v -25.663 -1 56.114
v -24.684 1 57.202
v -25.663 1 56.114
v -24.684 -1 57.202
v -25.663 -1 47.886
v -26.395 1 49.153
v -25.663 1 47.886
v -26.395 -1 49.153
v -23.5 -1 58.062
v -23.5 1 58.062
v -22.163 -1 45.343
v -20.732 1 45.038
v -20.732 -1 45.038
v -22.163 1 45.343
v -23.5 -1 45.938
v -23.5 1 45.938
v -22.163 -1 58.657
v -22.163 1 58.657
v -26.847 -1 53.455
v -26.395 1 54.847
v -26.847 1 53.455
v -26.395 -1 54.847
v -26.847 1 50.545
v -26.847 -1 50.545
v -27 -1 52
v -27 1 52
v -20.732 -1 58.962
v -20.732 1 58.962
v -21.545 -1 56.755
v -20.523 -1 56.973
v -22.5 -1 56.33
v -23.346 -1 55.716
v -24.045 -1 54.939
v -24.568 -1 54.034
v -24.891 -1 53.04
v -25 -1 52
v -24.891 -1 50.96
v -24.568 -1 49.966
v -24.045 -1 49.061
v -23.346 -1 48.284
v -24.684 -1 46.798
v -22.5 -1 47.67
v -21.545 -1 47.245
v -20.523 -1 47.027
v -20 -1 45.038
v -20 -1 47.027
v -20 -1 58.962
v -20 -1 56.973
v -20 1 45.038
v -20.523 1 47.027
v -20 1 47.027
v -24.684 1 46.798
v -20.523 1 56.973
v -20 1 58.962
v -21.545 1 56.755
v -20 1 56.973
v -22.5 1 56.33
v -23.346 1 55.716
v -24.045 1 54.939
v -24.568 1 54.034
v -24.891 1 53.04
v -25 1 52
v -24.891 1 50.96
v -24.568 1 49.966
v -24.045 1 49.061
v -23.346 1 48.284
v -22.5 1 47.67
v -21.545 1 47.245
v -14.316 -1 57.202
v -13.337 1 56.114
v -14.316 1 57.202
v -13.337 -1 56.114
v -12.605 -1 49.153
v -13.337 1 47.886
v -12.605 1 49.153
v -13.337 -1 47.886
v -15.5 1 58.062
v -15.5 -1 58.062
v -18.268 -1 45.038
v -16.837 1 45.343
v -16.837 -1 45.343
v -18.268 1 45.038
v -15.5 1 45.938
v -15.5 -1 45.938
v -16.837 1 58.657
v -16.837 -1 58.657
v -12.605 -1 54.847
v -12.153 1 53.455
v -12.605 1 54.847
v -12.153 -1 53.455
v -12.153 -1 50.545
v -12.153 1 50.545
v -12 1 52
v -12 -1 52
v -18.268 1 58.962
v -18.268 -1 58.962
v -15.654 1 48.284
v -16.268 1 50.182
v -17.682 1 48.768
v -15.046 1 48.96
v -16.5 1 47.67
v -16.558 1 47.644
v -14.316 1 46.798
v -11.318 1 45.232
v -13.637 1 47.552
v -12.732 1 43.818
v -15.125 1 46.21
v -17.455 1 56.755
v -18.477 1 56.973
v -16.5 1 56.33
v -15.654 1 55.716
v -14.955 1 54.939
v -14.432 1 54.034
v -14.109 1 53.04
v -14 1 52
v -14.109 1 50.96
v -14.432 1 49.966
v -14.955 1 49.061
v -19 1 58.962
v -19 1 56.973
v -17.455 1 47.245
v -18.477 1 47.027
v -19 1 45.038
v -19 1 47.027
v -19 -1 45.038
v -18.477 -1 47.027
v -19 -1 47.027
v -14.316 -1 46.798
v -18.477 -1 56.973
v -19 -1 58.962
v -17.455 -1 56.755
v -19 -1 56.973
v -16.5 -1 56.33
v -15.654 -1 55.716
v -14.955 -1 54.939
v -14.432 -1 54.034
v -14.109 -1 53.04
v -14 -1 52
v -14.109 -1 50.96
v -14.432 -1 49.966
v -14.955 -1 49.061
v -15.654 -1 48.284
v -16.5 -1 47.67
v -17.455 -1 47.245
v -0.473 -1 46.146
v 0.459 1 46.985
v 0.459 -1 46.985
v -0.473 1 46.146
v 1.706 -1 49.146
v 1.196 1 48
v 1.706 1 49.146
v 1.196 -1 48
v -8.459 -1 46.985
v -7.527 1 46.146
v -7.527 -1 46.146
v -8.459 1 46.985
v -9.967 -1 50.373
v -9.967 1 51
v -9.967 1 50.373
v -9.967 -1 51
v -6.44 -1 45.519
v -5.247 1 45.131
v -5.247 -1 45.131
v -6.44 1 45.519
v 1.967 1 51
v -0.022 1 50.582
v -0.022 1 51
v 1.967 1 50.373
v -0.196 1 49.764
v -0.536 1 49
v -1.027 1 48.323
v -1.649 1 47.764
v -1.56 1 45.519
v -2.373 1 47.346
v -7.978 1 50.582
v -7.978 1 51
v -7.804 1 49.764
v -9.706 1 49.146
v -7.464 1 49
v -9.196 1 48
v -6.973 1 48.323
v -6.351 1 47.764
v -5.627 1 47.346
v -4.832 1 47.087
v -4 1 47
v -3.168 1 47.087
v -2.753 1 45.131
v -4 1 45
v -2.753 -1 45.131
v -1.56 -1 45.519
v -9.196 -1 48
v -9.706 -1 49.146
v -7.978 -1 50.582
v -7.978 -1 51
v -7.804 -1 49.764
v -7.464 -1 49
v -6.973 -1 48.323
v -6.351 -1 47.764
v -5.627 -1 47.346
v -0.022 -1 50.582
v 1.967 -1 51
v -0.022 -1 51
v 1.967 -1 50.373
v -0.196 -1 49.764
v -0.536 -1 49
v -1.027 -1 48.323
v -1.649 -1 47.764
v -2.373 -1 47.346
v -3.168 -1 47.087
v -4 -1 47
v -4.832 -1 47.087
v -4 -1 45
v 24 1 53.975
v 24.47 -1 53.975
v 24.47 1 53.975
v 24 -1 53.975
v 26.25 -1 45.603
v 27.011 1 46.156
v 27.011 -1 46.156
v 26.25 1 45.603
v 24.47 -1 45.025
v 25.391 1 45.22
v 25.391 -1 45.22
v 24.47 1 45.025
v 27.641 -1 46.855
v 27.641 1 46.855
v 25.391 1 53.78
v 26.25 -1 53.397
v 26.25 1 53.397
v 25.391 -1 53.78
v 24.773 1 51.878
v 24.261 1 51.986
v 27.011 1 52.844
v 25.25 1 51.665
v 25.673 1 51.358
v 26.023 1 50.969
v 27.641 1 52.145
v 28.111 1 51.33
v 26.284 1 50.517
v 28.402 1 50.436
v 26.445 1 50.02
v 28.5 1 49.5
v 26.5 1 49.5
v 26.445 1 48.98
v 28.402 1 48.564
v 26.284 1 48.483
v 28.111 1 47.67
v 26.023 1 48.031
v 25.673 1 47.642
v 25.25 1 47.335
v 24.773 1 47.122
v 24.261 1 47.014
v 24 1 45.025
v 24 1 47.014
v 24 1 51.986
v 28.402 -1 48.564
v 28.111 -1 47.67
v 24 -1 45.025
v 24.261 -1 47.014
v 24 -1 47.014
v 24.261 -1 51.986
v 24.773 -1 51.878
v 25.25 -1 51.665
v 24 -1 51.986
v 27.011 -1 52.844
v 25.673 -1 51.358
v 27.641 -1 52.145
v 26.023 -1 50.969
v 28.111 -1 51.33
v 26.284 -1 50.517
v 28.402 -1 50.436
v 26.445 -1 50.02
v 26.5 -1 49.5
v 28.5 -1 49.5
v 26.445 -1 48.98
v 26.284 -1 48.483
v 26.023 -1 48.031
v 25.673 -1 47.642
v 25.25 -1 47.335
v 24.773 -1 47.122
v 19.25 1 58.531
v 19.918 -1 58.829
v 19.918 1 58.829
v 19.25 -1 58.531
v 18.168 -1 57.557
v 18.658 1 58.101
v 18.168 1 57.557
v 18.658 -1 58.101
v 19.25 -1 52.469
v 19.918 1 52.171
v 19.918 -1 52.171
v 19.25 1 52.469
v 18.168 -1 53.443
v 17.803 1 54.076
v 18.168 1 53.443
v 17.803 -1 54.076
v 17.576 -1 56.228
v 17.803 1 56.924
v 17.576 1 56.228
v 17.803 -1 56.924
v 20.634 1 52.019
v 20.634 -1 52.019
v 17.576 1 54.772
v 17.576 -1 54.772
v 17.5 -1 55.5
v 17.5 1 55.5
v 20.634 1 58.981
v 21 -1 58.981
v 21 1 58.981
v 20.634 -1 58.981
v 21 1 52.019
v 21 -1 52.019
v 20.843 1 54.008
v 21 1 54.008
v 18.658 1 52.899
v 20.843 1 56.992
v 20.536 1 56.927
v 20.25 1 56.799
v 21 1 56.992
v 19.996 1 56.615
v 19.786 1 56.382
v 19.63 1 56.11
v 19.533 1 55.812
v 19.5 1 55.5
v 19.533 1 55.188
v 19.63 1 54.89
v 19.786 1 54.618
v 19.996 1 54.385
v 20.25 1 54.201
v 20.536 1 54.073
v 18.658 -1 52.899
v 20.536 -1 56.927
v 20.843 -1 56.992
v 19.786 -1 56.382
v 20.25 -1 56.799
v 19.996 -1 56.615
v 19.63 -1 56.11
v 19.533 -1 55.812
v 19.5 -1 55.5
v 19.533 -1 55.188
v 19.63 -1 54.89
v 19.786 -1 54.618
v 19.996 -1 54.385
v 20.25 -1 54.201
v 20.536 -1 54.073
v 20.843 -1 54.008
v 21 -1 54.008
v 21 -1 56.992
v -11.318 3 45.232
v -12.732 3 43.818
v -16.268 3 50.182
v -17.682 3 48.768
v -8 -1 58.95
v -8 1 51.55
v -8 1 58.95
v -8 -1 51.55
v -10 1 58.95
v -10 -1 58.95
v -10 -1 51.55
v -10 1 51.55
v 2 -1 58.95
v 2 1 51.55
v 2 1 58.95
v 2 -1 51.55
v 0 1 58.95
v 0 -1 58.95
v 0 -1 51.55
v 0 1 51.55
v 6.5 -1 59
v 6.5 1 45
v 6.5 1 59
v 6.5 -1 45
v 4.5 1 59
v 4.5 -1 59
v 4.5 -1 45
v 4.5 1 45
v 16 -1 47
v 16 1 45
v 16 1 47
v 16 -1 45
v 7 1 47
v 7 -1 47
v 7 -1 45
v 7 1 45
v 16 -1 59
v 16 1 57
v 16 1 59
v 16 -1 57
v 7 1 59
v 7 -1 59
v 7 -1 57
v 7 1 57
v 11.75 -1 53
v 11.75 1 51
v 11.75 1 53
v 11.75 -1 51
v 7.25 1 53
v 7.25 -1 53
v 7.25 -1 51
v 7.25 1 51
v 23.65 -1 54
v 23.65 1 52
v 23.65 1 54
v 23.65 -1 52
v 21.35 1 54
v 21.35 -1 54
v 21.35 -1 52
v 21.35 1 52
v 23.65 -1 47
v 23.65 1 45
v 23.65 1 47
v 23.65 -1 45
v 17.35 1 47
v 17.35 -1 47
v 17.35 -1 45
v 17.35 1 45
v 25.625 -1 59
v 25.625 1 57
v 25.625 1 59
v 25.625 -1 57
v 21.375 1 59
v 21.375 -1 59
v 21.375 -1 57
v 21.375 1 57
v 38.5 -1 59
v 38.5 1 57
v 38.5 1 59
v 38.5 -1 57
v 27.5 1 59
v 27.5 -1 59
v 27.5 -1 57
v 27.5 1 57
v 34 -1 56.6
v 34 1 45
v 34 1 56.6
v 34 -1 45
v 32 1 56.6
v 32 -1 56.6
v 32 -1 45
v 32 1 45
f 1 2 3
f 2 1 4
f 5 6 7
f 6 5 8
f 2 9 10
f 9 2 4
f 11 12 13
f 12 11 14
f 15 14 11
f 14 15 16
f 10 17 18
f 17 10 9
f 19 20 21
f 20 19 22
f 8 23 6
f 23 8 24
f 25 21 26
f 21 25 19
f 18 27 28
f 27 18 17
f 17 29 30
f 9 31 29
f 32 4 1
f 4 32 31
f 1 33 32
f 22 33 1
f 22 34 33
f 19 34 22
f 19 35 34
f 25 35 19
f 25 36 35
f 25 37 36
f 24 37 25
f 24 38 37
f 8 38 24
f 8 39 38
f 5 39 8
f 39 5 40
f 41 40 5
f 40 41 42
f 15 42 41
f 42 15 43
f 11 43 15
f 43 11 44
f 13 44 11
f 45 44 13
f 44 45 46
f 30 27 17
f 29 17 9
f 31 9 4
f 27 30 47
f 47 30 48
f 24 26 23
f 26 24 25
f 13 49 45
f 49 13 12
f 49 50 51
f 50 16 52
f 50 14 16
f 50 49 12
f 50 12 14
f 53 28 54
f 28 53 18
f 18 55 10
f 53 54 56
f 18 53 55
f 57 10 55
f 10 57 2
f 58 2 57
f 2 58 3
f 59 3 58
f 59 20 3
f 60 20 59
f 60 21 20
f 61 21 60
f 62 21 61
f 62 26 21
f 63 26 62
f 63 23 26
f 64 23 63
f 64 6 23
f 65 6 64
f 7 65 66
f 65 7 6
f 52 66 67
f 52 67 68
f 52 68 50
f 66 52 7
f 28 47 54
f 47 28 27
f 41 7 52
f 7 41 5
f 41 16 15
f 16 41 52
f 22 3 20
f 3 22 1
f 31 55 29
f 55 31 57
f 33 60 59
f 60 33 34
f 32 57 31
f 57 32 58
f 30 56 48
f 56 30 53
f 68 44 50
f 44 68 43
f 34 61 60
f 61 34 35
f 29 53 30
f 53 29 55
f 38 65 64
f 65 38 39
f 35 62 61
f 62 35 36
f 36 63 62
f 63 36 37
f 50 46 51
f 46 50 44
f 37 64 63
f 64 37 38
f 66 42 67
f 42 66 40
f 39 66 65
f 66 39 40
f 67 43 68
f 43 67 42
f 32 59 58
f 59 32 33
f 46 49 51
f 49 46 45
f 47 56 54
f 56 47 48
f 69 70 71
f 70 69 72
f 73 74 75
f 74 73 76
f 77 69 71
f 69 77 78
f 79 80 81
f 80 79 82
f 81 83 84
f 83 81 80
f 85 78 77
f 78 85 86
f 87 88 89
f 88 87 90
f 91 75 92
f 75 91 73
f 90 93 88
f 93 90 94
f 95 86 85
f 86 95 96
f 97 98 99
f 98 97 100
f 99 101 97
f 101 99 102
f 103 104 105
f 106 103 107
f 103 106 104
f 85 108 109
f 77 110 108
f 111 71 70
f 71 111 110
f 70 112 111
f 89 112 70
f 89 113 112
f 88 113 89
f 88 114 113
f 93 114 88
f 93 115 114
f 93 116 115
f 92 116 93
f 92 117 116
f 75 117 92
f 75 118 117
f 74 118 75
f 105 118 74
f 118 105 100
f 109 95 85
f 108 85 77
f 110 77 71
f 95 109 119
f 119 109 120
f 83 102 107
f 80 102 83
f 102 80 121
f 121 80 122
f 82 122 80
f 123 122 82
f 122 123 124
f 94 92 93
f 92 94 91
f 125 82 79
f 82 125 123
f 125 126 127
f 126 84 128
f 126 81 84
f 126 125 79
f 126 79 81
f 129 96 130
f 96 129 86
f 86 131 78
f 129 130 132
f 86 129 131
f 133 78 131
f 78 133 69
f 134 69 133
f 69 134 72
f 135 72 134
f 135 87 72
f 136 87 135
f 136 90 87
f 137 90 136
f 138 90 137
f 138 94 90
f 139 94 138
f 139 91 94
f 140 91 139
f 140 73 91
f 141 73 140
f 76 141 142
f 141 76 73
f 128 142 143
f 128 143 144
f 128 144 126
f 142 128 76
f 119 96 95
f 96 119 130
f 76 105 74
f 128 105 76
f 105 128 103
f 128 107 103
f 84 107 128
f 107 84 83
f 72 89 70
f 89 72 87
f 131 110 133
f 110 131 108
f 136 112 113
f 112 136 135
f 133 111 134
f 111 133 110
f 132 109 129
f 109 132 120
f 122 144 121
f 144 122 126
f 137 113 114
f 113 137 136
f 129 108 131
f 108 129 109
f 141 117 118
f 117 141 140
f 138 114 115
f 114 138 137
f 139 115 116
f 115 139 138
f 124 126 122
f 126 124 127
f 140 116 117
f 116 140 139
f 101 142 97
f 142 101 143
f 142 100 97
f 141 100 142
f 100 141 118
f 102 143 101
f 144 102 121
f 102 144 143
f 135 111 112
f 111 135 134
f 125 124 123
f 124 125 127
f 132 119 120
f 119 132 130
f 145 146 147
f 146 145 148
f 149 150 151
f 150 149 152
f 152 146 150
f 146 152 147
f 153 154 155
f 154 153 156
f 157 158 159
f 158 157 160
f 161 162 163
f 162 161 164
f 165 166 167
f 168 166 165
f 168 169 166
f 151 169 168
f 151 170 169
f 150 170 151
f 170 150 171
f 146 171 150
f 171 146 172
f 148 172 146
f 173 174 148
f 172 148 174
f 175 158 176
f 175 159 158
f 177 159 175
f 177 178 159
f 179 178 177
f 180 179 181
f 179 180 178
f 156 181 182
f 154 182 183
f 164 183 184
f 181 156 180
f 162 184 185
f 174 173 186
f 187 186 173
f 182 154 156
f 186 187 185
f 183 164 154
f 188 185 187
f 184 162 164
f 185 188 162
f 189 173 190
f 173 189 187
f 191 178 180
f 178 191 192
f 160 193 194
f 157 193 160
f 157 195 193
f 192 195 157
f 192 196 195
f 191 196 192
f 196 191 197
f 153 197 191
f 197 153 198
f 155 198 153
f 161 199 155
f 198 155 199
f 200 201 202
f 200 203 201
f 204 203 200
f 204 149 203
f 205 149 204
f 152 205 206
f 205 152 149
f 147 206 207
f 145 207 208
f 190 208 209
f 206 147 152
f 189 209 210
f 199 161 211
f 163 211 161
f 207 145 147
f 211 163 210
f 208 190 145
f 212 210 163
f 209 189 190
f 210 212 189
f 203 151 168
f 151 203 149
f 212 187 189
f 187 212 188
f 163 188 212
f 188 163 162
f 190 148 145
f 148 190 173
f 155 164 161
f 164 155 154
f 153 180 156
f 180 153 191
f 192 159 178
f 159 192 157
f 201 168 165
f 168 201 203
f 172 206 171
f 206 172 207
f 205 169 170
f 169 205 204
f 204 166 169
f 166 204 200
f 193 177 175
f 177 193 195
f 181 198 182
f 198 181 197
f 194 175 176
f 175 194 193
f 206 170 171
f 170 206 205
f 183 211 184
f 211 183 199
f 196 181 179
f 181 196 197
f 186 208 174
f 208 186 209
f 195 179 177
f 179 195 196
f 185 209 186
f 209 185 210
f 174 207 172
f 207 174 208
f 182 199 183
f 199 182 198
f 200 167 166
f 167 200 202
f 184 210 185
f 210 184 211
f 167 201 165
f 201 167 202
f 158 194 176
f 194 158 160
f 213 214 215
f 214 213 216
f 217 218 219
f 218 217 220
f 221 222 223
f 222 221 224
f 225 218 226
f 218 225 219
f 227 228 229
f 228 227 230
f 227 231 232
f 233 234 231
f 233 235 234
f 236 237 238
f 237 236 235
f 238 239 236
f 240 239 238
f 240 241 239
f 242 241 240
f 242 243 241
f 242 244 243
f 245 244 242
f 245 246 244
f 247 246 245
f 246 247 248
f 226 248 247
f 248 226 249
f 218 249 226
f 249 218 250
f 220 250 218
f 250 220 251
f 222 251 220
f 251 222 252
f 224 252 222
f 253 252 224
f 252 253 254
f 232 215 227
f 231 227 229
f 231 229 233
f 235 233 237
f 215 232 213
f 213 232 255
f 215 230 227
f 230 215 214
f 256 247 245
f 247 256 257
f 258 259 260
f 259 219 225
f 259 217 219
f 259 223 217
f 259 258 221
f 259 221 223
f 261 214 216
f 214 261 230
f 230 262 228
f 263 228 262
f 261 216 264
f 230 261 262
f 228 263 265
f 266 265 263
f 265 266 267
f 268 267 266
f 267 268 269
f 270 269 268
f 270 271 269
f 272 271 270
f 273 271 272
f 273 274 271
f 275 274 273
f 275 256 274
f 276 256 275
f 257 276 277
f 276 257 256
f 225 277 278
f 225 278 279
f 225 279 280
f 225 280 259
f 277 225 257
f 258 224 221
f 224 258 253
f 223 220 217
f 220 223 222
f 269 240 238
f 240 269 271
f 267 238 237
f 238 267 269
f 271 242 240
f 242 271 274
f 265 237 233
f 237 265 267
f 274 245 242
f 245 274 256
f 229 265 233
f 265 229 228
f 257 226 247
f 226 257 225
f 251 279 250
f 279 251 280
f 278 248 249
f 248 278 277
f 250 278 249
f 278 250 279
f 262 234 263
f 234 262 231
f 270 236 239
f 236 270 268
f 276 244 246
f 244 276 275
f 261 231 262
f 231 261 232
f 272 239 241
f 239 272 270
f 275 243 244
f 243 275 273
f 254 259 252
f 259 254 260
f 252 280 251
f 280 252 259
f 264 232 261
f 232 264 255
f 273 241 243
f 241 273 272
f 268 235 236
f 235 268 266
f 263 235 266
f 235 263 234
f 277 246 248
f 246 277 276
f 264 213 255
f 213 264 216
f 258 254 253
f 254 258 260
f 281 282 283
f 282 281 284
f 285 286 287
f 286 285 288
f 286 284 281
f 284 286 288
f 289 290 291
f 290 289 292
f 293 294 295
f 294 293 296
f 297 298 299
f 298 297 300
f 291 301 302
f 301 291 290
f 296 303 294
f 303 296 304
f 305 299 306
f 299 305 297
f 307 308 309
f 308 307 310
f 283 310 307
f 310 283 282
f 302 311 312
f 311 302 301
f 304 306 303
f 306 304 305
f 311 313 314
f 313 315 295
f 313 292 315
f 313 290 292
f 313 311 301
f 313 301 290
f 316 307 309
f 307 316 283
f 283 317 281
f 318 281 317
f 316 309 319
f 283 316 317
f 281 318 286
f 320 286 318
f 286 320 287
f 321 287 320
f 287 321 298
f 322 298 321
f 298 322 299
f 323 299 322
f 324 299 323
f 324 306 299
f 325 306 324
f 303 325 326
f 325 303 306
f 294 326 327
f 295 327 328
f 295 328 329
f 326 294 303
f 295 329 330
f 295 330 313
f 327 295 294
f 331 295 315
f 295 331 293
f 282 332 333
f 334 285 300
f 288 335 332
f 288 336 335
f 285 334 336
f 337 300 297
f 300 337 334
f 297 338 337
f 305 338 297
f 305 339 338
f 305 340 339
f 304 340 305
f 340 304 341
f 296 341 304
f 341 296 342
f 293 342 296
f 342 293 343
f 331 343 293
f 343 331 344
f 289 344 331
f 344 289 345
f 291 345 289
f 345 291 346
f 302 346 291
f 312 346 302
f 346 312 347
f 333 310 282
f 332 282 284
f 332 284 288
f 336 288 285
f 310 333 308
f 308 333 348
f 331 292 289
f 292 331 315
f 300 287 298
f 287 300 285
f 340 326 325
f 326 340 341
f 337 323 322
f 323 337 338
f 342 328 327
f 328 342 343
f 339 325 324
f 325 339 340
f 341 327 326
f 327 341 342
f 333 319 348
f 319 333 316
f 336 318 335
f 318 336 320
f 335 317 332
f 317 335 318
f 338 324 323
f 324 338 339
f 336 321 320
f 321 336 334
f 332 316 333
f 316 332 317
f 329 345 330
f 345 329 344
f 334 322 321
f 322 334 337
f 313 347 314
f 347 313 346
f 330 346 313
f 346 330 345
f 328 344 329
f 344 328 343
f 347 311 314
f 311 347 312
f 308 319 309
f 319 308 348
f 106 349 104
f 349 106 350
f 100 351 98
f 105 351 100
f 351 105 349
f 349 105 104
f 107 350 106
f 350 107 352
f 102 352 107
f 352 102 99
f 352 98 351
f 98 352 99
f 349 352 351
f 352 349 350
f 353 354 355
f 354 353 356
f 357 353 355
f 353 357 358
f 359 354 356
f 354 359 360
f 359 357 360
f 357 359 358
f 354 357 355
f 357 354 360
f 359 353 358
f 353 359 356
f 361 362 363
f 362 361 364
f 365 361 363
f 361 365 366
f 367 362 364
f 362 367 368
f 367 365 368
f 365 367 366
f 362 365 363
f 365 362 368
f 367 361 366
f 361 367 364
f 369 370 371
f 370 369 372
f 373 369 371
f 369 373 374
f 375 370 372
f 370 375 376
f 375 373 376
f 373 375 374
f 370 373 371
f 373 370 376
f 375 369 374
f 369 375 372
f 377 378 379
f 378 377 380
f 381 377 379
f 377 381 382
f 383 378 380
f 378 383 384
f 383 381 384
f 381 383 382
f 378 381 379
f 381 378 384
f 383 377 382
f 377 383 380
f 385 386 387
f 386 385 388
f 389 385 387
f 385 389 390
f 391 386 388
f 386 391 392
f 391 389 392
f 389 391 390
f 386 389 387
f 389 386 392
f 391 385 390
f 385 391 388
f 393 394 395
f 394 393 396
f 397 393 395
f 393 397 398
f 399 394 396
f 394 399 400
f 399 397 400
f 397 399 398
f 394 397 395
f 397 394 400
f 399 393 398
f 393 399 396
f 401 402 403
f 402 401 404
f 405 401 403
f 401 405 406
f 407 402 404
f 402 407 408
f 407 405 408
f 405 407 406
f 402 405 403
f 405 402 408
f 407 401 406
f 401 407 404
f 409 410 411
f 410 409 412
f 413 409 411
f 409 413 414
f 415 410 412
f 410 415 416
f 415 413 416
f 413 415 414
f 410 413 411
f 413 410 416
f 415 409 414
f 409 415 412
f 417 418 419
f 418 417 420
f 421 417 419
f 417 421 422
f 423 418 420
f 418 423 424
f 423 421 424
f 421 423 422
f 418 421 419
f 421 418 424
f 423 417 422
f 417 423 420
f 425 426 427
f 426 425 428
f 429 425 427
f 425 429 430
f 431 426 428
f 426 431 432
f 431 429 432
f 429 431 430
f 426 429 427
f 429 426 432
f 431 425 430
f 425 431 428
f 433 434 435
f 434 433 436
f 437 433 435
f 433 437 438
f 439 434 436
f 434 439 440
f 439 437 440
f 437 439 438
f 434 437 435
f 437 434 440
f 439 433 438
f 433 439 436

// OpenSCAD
translate([0,0,30])
{
color("#E0D44A")
{
translate([-20,0,22])
rotate([90,0,0])
semicircle(7,2);
translate([-19,0,22])
rotate([90,0,180])
semicircle(7,2);
translate([-14.5,2,17])
rotate([0,45,0])
cube([7,2,2],center=true);
translate([-4,0,21])
rotate([90,-90,0])
semicircle(6,2);
translate([-9,0,25.25])
cube([2,2,7.4],center=true);
translate([1,0,25.25])
cube([2,2,7.4],center=true);
translate([5.5,0,22])
cube([2,2,14],center=true);
translate([11.5,0,16])
cube([9,2,2],center=true);
translate([11.5,0,28])
cube([9,2,2],center=true);
translate([9.5,0,22])
cube([4.5,2,2],center=true);
translate([24,0,19.5])
rotate([90,180,0])
semicircle(4.5,2);
translate([21,0,25.5])
rotate([90,0,0])
semicircle(3.5,2);
translate([22.5,0,23])
cube([2.3,2,2],center=true);
translate([20.5,0,16])
cube([6.3,2,2],center=true);
translate([23.5,0,28])
cube([4.25,2,2],center=true);
translate([33,0,28])
cube([11,2,2],center=true);
translate([33,0,20.8])
cube([2,2,11.6],center=true);
}

color("DarkOrange",(0.9*$t))
translate([-18,0,1])
rotate([90,0,0])
scale([0.4,0.3,0.4])
union(){
text("A Long Ray's Journey",font="Times New Roman");
translate([30,-14,0])
text("Into Light",font="Times New Roman");
}
}




module semicircle(radius=4,height=1) {
    
difference() {
    cylinder(height, radius, radius, $fn=30,center=true);
    cylinder(height+0.2, radius-2, radius-2, $fn=30,center=true);
    translate([radius,0,0])
    cube([(radius*2),(radius*2),height+1],center=true);
}
}
